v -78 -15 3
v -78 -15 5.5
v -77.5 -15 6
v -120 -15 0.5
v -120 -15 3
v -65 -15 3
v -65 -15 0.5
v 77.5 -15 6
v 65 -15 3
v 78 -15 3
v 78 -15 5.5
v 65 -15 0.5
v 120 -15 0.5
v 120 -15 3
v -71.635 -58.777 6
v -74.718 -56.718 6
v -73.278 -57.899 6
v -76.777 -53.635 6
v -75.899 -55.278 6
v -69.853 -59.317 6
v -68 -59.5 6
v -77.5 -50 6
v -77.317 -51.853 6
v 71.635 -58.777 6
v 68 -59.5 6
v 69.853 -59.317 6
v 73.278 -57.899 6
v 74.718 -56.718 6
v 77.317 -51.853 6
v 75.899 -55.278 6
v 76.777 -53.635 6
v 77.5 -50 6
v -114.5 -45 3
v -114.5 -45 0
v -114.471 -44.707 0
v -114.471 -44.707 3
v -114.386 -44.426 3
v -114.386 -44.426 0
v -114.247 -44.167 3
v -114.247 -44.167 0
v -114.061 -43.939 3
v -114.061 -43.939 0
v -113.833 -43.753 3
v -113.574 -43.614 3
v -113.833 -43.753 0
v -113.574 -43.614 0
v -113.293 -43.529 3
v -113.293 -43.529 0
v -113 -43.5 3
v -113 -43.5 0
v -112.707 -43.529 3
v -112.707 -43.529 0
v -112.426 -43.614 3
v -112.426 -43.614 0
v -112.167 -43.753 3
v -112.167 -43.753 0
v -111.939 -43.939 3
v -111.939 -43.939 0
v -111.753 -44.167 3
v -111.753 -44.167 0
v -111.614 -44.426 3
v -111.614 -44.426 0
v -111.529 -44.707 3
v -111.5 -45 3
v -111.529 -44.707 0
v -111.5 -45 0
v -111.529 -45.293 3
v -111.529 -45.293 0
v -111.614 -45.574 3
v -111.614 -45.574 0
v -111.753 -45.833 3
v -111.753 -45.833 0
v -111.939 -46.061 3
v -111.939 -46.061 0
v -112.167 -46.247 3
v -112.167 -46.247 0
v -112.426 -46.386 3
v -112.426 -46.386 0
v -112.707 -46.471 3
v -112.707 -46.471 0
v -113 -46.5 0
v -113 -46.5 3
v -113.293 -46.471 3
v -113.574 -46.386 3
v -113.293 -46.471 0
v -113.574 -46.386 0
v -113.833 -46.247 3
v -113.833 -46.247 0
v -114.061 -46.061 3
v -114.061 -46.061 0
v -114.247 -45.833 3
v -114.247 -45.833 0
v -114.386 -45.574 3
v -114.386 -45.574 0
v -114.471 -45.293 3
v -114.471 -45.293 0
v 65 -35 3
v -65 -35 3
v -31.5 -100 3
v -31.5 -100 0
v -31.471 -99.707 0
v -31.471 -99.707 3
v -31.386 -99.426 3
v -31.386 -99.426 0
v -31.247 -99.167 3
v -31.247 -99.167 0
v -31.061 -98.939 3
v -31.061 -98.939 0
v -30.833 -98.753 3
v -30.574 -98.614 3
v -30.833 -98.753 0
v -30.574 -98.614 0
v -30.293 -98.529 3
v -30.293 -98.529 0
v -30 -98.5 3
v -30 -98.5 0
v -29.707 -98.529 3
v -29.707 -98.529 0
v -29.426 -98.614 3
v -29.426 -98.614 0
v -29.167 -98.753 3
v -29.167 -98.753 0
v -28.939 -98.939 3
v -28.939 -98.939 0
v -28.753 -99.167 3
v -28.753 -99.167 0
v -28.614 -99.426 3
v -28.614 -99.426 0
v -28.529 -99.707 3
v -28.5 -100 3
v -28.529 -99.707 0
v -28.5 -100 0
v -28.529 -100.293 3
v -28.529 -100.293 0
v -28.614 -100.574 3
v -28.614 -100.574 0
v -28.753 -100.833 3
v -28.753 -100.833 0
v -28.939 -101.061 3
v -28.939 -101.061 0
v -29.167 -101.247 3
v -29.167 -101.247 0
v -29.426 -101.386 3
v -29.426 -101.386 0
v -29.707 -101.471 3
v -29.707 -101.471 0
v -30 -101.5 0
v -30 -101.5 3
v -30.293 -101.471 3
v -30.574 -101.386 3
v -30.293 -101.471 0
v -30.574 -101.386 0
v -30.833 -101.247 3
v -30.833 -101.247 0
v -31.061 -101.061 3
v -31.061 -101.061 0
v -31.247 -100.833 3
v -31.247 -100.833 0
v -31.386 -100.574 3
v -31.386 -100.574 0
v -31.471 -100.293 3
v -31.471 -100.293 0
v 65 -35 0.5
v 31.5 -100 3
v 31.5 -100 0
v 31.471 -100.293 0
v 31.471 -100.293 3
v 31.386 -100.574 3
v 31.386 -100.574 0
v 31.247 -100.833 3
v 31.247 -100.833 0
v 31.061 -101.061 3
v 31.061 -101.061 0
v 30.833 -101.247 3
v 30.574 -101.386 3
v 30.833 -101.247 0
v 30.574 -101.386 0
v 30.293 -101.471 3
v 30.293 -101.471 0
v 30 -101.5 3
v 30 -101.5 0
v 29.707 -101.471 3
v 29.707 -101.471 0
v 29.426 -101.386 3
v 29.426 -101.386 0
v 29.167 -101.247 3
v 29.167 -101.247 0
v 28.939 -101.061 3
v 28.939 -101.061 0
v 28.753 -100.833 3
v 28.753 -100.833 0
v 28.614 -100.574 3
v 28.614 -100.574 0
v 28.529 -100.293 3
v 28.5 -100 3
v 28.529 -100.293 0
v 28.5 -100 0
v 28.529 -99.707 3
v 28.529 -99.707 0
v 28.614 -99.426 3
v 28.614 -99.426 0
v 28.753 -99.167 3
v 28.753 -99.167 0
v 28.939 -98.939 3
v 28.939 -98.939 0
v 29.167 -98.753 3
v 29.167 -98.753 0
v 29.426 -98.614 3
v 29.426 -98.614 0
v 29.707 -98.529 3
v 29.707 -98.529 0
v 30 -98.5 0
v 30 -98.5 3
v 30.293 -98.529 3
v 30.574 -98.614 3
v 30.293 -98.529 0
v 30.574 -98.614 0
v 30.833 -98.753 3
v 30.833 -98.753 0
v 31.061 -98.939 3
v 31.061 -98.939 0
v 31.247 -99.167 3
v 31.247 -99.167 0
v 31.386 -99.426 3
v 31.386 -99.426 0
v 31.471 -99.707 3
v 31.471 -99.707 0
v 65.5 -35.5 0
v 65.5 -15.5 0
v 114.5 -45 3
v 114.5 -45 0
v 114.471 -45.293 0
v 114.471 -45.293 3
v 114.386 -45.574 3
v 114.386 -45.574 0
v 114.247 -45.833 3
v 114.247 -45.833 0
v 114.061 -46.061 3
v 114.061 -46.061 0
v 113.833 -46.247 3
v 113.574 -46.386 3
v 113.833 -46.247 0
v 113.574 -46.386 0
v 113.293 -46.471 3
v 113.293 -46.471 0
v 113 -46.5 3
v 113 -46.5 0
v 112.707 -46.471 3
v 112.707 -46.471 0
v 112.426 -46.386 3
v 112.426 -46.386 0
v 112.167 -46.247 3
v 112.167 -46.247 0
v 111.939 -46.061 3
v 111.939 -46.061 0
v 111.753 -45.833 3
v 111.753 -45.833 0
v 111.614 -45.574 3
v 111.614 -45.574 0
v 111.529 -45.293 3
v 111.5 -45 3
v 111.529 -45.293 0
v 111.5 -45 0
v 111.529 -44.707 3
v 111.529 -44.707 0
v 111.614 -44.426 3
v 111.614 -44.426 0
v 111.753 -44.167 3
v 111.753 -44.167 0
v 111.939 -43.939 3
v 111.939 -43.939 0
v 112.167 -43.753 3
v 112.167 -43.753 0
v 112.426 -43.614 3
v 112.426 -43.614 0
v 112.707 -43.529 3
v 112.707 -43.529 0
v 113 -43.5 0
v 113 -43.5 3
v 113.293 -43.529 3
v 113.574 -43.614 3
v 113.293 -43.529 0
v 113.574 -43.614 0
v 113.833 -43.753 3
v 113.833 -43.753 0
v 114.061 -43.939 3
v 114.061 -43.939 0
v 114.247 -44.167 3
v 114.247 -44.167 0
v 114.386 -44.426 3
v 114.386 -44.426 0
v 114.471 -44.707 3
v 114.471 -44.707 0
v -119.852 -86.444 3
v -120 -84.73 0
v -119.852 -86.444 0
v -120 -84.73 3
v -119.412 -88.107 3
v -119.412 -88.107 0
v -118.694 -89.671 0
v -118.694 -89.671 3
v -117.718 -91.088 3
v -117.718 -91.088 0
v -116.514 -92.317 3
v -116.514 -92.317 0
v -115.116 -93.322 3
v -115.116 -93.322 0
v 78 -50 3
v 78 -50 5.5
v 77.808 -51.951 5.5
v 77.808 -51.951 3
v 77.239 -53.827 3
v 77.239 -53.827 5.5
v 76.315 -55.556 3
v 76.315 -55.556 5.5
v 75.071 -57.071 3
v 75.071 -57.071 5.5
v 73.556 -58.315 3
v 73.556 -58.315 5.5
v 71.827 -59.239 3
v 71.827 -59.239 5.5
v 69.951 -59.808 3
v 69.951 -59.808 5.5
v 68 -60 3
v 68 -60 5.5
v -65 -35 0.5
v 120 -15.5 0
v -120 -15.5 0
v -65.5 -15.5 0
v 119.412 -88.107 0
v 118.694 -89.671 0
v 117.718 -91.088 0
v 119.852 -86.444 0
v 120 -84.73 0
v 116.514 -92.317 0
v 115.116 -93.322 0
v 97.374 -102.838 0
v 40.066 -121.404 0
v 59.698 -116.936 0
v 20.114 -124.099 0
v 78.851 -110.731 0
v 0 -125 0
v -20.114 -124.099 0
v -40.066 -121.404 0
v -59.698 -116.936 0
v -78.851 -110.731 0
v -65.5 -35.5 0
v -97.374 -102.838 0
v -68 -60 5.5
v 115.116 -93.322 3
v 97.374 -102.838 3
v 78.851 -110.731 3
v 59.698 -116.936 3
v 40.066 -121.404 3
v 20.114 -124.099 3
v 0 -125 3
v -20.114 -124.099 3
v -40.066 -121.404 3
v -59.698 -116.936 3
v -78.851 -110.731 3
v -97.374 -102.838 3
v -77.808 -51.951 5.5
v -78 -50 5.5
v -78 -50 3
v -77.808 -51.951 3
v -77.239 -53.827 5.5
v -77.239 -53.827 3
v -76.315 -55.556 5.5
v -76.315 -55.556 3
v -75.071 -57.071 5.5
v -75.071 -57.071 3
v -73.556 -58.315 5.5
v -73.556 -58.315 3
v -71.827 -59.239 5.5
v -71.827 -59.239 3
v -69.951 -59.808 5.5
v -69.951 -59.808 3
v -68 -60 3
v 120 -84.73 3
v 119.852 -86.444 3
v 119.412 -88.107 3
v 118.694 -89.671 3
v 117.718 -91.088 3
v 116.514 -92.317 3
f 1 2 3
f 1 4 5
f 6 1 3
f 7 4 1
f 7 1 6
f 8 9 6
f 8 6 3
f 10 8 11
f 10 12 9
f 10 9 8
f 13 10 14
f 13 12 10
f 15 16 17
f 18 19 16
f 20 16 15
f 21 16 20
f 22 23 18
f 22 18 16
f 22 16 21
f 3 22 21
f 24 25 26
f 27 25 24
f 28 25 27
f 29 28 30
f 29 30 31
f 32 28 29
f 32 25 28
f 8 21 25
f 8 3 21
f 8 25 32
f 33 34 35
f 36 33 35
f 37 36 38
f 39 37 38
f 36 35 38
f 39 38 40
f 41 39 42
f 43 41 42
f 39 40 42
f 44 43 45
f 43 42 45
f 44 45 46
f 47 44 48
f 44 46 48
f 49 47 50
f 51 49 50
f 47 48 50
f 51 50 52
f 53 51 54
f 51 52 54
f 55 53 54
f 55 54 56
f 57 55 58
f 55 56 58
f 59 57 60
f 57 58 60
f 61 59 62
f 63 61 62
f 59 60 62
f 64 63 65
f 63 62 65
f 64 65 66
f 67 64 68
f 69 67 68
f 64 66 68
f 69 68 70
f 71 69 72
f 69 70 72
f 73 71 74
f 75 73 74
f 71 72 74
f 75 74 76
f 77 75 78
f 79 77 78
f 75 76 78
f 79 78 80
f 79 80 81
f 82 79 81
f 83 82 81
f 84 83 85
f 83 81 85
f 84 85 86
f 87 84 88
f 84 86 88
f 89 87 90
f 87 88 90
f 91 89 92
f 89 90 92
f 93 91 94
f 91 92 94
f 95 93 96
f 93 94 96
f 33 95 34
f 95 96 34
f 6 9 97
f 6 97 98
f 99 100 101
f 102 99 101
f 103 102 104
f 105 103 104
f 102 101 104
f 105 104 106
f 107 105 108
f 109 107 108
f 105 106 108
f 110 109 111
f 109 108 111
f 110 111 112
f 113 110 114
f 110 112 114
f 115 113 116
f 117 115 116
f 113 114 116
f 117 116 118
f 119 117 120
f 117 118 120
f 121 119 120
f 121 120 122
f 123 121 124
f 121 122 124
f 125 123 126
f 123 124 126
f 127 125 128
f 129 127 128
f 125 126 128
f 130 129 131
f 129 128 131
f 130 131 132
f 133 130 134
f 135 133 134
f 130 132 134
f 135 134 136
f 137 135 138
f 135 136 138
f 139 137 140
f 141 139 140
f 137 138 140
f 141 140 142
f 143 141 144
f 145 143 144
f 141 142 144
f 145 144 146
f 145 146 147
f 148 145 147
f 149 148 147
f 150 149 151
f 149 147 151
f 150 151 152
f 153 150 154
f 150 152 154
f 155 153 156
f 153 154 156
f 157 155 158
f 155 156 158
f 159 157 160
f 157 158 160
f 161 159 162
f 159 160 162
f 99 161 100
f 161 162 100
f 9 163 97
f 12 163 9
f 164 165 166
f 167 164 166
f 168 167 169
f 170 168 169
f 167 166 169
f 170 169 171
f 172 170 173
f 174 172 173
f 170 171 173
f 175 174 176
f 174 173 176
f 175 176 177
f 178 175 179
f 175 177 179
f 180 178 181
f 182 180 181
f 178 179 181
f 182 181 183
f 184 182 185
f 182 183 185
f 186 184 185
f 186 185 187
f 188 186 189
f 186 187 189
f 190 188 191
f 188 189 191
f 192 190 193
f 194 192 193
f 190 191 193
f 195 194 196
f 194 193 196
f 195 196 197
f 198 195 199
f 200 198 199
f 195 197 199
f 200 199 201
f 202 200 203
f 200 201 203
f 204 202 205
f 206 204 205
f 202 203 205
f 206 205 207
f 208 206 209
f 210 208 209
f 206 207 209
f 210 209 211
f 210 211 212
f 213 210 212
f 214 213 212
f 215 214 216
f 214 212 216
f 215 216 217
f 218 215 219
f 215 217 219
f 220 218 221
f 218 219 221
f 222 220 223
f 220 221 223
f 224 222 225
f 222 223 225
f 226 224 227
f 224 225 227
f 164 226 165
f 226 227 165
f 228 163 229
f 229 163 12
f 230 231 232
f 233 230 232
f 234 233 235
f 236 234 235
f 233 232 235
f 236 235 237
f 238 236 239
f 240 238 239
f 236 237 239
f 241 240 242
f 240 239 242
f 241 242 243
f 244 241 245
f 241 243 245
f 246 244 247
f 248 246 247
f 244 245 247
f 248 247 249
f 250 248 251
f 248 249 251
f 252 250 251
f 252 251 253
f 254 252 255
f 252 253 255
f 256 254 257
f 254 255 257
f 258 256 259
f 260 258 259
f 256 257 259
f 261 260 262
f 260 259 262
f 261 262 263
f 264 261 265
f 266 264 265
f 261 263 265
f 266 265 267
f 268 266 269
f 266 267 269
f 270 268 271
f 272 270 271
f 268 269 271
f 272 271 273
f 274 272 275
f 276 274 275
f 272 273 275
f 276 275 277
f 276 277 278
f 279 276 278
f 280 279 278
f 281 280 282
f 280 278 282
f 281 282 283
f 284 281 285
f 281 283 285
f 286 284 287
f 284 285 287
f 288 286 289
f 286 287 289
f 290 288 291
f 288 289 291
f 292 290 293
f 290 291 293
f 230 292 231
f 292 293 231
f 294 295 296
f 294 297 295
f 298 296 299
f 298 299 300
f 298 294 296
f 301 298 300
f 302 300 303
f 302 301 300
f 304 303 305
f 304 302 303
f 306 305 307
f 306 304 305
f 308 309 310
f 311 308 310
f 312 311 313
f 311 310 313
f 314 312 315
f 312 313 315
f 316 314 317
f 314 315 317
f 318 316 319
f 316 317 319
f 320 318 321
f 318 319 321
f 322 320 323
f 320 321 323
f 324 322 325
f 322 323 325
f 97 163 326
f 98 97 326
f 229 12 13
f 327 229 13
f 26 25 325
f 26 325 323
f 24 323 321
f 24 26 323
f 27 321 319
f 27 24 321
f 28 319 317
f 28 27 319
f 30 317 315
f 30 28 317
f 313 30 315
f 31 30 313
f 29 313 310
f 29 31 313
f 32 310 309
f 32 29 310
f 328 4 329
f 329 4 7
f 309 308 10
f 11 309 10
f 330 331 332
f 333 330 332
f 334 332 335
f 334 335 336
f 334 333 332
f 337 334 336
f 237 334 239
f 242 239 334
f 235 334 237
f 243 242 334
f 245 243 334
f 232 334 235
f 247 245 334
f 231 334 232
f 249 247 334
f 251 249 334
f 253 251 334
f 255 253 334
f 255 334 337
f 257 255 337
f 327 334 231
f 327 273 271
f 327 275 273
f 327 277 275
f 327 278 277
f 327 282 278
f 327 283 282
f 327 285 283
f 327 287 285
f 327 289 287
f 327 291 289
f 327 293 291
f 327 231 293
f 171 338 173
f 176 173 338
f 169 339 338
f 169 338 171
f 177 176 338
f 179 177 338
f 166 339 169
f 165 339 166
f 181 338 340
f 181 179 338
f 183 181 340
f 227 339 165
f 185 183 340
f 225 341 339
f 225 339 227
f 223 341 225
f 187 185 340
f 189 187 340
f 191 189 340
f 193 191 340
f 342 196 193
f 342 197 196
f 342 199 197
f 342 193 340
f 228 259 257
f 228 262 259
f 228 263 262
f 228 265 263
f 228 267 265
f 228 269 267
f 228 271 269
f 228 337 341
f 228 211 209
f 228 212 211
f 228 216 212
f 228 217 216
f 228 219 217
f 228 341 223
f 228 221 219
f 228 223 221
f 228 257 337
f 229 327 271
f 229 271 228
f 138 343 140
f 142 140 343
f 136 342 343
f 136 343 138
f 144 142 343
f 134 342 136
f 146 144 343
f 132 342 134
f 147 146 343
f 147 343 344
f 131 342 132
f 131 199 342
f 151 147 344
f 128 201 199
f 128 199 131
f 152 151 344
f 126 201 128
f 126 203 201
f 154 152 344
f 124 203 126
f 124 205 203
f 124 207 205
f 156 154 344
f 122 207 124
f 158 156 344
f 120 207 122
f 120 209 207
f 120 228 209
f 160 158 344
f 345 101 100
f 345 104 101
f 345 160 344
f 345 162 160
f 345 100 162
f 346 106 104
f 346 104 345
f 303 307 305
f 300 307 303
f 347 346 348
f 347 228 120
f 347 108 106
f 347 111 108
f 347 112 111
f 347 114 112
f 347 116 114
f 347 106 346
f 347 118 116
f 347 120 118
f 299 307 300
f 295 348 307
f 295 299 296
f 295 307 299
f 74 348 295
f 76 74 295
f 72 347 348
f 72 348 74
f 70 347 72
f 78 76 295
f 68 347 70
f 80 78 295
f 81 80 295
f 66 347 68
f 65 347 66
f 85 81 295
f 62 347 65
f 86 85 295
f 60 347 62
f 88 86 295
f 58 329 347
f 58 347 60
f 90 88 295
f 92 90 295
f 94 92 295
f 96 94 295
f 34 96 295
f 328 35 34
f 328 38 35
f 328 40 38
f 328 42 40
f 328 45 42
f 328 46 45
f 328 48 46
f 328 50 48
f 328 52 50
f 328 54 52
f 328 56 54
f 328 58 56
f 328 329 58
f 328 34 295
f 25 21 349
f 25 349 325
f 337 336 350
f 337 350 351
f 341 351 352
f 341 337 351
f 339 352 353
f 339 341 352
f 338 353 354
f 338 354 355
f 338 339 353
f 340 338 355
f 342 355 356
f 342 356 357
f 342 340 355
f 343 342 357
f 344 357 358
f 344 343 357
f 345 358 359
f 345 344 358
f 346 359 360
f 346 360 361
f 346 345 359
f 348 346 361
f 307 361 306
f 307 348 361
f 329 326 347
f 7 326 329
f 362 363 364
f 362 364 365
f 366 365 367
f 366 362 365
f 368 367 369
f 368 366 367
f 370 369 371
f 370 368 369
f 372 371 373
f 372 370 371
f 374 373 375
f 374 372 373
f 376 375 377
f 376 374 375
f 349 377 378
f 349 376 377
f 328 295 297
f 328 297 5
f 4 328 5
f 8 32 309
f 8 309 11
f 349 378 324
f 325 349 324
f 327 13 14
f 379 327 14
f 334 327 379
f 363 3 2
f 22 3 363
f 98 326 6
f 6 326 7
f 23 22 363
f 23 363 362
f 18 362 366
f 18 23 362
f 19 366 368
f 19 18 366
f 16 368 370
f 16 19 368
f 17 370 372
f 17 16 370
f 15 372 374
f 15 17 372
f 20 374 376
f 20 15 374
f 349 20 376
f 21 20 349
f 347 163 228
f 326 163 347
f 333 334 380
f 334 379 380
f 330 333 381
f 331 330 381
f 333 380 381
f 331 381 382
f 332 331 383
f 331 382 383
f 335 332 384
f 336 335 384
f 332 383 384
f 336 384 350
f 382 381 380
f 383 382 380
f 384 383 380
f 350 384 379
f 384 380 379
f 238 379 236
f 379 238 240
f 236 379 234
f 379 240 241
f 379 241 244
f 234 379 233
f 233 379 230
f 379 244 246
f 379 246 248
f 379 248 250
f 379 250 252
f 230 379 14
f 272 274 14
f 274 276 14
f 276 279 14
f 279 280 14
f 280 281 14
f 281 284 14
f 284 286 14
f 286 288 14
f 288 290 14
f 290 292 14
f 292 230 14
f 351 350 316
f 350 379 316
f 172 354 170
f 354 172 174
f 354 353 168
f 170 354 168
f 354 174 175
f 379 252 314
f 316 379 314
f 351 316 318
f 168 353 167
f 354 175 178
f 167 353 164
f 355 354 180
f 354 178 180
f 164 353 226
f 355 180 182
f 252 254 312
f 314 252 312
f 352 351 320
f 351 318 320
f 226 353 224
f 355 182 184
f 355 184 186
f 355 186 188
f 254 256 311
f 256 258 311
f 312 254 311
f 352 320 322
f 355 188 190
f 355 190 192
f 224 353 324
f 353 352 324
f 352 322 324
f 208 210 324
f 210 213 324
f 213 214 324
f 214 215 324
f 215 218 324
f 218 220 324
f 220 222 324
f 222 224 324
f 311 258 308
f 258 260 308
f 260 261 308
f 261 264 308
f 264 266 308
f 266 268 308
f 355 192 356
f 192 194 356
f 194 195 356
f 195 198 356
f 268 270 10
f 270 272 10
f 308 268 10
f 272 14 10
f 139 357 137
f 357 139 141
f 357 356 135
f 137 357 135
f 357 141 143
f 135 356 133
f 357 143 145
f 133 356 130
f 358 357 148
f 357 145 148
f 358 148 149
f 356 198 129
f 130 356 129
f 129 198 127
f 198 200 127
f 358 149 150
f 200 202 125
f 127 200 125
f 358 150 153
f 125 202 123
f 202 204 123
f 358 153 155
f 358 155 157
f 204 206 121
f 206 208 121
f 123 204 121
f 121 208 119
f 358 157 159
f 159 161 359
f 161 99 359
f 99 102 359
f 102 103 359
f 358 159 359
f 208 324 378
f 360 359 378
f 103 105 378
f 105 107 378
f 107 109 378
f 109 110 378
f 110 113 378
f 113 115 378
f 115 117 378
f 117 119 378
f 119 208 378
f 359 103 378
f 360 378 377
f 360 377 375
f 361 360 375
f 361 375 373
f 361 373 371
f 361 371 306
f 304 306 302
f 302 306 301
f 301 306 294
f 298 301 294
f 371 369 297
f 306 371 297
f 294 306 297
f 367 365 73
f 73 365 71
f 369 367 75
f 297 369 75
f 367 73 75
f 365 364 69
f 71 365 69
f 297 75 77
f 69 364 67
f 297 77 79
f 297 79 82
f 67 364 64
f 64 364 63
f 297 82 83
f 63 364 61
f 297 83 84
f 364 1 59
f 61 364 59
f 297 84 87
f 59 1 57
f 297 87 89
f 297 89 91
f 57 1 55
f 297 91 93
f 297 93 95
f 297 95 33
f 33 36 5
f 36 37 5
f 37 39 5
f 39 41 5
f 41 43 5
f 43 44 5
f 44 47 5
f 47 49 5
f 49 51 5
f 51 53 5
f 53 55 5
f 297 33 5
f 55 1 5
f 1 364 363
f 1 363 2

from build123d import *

# Parameters (mm, degrees)
EXTRUDE_1_DEPTH     = 3
SKETCH_2_W          = 156
SKETCH_2_H          = 45
EXTRUDE_2_DEPTH     = 3
SKETCH_3_R          = 1.5
CUT_EXTRUDE_1_DEPTH = 3
SKETCH_4_W          = 130
SKETCH_4_H          = 20
CUT_EXTRUDE_2_DEPTH = 3
FILLET_1_R          = 10
CHAMFER_1_SIZE      = 0.5
FILLET_2_R          = 10
CHAMFER_2_SIZE      = 0.5


with BuildPart() as part:
    # 草图1 → 凸台-拉伸1 (new body)
    with BuildSketch(Plane.XY):
        with BuildLine():
            Line((-120, -15), (120, -15))
            Line((120, -15), (120, -90.328663107))
            ThreePointArc((120, -90.328663107), (0, -125), (-120, -90.328663107))
            Line((-120, -90.328663107), (-120, -15))
        make_face()
    extrude(amount=EXTRUDE_1_DEPTH)

    # 草图2 → 凸台-拉伸2 (add)
    with BuildSketch(Plane.XY.offset(3)):
        with Locations((0, -37.5)):
            Rectangle(SKETCH_2_W, SKETCH_2_H)
    extrude(amount=EXTRUDE_2_DEPTH)

    # 草图3 → 切除-拉伸1 (cut)
    with BuildSketch(Plane(origin=(0, 0, 0), x_dir=(-1, 0, 0), z_dir=(0, 0, -1))):
        with Locations((30, -100)):
            Circle(SKETCH_3_R)
        with Locations((113, -45)):
            Circle(SKETCH_3_R)
        with Locations(Location((-113, -45, 0), (0, 0, 180))):
            Circle(SKETCH_3_R)
        with Locations(Location((-30, -100, 0), (0, 0, 180))):
            Circle(SKETCH_3_R)
    extrude(amount=-CUT_EXTRUDE_1_DEPTH, mode=Mode.SUBTRACT)

    # 草图4 → 切除-拉伸2 (cut)
    with BuildSketch(Plane(origin=(0, 0, 0), x_dir=(-1, 0, 0), z_dir=(0, 0, -1))):
        with Locations((0, -25)):
            Rectangle(SKETCH_4_W, SKETCH_4_H)
    extrude(amount=-CUT_EXTRUDE_2_DEPTH, mode=Mode.SUBTRACT)

    # 圆角1
    fillet_1_edges = [part.edges().sort_by_distance(p)[0] for p in [
        (120, -90.328663107, 1.5),
        (-120, -90.328663107, 1.5),
    ]]
    fillet(fillet_1_edges, radius=FILLET_1_R)

    # 倒角1
    chamfer_1_edges = [part.edges().sort_by_distance(p)[0] for p in [
        (-92.5, -15, 0),
        (92.5, -15, 0),
        (65, -25, 0),
        (0, -35, 0),
        (-65, -25, 0),
    ]]
    chamfer(chamfer_1_edges, length=CHAMFER_1_SIZE)

    # 圆角2
    fillet_2_edges = [part.edges().sort_by_distance(p)[0] for p in [
        (-78, -60, 4.5),
        (78, -60, 4.5),
    ]]
    fillet(fillet_2_edges, radius=FILLET_2_R)

    # 倒角2
    chamfer_2_edges = [part.edges().sort_by_distance(p)[0] for p in [
        (-75.071067812, -57.071067812, 6),
        (-78, -32.5, 6),
        (0, -60, 6),
        (78, -32.5, 6),
        (75.071067812, -57.071067812, 6),
    ]]
    chamfer(chamfer_2_edges, length=CHAMFER_2_SIZE)


solid = part.part
